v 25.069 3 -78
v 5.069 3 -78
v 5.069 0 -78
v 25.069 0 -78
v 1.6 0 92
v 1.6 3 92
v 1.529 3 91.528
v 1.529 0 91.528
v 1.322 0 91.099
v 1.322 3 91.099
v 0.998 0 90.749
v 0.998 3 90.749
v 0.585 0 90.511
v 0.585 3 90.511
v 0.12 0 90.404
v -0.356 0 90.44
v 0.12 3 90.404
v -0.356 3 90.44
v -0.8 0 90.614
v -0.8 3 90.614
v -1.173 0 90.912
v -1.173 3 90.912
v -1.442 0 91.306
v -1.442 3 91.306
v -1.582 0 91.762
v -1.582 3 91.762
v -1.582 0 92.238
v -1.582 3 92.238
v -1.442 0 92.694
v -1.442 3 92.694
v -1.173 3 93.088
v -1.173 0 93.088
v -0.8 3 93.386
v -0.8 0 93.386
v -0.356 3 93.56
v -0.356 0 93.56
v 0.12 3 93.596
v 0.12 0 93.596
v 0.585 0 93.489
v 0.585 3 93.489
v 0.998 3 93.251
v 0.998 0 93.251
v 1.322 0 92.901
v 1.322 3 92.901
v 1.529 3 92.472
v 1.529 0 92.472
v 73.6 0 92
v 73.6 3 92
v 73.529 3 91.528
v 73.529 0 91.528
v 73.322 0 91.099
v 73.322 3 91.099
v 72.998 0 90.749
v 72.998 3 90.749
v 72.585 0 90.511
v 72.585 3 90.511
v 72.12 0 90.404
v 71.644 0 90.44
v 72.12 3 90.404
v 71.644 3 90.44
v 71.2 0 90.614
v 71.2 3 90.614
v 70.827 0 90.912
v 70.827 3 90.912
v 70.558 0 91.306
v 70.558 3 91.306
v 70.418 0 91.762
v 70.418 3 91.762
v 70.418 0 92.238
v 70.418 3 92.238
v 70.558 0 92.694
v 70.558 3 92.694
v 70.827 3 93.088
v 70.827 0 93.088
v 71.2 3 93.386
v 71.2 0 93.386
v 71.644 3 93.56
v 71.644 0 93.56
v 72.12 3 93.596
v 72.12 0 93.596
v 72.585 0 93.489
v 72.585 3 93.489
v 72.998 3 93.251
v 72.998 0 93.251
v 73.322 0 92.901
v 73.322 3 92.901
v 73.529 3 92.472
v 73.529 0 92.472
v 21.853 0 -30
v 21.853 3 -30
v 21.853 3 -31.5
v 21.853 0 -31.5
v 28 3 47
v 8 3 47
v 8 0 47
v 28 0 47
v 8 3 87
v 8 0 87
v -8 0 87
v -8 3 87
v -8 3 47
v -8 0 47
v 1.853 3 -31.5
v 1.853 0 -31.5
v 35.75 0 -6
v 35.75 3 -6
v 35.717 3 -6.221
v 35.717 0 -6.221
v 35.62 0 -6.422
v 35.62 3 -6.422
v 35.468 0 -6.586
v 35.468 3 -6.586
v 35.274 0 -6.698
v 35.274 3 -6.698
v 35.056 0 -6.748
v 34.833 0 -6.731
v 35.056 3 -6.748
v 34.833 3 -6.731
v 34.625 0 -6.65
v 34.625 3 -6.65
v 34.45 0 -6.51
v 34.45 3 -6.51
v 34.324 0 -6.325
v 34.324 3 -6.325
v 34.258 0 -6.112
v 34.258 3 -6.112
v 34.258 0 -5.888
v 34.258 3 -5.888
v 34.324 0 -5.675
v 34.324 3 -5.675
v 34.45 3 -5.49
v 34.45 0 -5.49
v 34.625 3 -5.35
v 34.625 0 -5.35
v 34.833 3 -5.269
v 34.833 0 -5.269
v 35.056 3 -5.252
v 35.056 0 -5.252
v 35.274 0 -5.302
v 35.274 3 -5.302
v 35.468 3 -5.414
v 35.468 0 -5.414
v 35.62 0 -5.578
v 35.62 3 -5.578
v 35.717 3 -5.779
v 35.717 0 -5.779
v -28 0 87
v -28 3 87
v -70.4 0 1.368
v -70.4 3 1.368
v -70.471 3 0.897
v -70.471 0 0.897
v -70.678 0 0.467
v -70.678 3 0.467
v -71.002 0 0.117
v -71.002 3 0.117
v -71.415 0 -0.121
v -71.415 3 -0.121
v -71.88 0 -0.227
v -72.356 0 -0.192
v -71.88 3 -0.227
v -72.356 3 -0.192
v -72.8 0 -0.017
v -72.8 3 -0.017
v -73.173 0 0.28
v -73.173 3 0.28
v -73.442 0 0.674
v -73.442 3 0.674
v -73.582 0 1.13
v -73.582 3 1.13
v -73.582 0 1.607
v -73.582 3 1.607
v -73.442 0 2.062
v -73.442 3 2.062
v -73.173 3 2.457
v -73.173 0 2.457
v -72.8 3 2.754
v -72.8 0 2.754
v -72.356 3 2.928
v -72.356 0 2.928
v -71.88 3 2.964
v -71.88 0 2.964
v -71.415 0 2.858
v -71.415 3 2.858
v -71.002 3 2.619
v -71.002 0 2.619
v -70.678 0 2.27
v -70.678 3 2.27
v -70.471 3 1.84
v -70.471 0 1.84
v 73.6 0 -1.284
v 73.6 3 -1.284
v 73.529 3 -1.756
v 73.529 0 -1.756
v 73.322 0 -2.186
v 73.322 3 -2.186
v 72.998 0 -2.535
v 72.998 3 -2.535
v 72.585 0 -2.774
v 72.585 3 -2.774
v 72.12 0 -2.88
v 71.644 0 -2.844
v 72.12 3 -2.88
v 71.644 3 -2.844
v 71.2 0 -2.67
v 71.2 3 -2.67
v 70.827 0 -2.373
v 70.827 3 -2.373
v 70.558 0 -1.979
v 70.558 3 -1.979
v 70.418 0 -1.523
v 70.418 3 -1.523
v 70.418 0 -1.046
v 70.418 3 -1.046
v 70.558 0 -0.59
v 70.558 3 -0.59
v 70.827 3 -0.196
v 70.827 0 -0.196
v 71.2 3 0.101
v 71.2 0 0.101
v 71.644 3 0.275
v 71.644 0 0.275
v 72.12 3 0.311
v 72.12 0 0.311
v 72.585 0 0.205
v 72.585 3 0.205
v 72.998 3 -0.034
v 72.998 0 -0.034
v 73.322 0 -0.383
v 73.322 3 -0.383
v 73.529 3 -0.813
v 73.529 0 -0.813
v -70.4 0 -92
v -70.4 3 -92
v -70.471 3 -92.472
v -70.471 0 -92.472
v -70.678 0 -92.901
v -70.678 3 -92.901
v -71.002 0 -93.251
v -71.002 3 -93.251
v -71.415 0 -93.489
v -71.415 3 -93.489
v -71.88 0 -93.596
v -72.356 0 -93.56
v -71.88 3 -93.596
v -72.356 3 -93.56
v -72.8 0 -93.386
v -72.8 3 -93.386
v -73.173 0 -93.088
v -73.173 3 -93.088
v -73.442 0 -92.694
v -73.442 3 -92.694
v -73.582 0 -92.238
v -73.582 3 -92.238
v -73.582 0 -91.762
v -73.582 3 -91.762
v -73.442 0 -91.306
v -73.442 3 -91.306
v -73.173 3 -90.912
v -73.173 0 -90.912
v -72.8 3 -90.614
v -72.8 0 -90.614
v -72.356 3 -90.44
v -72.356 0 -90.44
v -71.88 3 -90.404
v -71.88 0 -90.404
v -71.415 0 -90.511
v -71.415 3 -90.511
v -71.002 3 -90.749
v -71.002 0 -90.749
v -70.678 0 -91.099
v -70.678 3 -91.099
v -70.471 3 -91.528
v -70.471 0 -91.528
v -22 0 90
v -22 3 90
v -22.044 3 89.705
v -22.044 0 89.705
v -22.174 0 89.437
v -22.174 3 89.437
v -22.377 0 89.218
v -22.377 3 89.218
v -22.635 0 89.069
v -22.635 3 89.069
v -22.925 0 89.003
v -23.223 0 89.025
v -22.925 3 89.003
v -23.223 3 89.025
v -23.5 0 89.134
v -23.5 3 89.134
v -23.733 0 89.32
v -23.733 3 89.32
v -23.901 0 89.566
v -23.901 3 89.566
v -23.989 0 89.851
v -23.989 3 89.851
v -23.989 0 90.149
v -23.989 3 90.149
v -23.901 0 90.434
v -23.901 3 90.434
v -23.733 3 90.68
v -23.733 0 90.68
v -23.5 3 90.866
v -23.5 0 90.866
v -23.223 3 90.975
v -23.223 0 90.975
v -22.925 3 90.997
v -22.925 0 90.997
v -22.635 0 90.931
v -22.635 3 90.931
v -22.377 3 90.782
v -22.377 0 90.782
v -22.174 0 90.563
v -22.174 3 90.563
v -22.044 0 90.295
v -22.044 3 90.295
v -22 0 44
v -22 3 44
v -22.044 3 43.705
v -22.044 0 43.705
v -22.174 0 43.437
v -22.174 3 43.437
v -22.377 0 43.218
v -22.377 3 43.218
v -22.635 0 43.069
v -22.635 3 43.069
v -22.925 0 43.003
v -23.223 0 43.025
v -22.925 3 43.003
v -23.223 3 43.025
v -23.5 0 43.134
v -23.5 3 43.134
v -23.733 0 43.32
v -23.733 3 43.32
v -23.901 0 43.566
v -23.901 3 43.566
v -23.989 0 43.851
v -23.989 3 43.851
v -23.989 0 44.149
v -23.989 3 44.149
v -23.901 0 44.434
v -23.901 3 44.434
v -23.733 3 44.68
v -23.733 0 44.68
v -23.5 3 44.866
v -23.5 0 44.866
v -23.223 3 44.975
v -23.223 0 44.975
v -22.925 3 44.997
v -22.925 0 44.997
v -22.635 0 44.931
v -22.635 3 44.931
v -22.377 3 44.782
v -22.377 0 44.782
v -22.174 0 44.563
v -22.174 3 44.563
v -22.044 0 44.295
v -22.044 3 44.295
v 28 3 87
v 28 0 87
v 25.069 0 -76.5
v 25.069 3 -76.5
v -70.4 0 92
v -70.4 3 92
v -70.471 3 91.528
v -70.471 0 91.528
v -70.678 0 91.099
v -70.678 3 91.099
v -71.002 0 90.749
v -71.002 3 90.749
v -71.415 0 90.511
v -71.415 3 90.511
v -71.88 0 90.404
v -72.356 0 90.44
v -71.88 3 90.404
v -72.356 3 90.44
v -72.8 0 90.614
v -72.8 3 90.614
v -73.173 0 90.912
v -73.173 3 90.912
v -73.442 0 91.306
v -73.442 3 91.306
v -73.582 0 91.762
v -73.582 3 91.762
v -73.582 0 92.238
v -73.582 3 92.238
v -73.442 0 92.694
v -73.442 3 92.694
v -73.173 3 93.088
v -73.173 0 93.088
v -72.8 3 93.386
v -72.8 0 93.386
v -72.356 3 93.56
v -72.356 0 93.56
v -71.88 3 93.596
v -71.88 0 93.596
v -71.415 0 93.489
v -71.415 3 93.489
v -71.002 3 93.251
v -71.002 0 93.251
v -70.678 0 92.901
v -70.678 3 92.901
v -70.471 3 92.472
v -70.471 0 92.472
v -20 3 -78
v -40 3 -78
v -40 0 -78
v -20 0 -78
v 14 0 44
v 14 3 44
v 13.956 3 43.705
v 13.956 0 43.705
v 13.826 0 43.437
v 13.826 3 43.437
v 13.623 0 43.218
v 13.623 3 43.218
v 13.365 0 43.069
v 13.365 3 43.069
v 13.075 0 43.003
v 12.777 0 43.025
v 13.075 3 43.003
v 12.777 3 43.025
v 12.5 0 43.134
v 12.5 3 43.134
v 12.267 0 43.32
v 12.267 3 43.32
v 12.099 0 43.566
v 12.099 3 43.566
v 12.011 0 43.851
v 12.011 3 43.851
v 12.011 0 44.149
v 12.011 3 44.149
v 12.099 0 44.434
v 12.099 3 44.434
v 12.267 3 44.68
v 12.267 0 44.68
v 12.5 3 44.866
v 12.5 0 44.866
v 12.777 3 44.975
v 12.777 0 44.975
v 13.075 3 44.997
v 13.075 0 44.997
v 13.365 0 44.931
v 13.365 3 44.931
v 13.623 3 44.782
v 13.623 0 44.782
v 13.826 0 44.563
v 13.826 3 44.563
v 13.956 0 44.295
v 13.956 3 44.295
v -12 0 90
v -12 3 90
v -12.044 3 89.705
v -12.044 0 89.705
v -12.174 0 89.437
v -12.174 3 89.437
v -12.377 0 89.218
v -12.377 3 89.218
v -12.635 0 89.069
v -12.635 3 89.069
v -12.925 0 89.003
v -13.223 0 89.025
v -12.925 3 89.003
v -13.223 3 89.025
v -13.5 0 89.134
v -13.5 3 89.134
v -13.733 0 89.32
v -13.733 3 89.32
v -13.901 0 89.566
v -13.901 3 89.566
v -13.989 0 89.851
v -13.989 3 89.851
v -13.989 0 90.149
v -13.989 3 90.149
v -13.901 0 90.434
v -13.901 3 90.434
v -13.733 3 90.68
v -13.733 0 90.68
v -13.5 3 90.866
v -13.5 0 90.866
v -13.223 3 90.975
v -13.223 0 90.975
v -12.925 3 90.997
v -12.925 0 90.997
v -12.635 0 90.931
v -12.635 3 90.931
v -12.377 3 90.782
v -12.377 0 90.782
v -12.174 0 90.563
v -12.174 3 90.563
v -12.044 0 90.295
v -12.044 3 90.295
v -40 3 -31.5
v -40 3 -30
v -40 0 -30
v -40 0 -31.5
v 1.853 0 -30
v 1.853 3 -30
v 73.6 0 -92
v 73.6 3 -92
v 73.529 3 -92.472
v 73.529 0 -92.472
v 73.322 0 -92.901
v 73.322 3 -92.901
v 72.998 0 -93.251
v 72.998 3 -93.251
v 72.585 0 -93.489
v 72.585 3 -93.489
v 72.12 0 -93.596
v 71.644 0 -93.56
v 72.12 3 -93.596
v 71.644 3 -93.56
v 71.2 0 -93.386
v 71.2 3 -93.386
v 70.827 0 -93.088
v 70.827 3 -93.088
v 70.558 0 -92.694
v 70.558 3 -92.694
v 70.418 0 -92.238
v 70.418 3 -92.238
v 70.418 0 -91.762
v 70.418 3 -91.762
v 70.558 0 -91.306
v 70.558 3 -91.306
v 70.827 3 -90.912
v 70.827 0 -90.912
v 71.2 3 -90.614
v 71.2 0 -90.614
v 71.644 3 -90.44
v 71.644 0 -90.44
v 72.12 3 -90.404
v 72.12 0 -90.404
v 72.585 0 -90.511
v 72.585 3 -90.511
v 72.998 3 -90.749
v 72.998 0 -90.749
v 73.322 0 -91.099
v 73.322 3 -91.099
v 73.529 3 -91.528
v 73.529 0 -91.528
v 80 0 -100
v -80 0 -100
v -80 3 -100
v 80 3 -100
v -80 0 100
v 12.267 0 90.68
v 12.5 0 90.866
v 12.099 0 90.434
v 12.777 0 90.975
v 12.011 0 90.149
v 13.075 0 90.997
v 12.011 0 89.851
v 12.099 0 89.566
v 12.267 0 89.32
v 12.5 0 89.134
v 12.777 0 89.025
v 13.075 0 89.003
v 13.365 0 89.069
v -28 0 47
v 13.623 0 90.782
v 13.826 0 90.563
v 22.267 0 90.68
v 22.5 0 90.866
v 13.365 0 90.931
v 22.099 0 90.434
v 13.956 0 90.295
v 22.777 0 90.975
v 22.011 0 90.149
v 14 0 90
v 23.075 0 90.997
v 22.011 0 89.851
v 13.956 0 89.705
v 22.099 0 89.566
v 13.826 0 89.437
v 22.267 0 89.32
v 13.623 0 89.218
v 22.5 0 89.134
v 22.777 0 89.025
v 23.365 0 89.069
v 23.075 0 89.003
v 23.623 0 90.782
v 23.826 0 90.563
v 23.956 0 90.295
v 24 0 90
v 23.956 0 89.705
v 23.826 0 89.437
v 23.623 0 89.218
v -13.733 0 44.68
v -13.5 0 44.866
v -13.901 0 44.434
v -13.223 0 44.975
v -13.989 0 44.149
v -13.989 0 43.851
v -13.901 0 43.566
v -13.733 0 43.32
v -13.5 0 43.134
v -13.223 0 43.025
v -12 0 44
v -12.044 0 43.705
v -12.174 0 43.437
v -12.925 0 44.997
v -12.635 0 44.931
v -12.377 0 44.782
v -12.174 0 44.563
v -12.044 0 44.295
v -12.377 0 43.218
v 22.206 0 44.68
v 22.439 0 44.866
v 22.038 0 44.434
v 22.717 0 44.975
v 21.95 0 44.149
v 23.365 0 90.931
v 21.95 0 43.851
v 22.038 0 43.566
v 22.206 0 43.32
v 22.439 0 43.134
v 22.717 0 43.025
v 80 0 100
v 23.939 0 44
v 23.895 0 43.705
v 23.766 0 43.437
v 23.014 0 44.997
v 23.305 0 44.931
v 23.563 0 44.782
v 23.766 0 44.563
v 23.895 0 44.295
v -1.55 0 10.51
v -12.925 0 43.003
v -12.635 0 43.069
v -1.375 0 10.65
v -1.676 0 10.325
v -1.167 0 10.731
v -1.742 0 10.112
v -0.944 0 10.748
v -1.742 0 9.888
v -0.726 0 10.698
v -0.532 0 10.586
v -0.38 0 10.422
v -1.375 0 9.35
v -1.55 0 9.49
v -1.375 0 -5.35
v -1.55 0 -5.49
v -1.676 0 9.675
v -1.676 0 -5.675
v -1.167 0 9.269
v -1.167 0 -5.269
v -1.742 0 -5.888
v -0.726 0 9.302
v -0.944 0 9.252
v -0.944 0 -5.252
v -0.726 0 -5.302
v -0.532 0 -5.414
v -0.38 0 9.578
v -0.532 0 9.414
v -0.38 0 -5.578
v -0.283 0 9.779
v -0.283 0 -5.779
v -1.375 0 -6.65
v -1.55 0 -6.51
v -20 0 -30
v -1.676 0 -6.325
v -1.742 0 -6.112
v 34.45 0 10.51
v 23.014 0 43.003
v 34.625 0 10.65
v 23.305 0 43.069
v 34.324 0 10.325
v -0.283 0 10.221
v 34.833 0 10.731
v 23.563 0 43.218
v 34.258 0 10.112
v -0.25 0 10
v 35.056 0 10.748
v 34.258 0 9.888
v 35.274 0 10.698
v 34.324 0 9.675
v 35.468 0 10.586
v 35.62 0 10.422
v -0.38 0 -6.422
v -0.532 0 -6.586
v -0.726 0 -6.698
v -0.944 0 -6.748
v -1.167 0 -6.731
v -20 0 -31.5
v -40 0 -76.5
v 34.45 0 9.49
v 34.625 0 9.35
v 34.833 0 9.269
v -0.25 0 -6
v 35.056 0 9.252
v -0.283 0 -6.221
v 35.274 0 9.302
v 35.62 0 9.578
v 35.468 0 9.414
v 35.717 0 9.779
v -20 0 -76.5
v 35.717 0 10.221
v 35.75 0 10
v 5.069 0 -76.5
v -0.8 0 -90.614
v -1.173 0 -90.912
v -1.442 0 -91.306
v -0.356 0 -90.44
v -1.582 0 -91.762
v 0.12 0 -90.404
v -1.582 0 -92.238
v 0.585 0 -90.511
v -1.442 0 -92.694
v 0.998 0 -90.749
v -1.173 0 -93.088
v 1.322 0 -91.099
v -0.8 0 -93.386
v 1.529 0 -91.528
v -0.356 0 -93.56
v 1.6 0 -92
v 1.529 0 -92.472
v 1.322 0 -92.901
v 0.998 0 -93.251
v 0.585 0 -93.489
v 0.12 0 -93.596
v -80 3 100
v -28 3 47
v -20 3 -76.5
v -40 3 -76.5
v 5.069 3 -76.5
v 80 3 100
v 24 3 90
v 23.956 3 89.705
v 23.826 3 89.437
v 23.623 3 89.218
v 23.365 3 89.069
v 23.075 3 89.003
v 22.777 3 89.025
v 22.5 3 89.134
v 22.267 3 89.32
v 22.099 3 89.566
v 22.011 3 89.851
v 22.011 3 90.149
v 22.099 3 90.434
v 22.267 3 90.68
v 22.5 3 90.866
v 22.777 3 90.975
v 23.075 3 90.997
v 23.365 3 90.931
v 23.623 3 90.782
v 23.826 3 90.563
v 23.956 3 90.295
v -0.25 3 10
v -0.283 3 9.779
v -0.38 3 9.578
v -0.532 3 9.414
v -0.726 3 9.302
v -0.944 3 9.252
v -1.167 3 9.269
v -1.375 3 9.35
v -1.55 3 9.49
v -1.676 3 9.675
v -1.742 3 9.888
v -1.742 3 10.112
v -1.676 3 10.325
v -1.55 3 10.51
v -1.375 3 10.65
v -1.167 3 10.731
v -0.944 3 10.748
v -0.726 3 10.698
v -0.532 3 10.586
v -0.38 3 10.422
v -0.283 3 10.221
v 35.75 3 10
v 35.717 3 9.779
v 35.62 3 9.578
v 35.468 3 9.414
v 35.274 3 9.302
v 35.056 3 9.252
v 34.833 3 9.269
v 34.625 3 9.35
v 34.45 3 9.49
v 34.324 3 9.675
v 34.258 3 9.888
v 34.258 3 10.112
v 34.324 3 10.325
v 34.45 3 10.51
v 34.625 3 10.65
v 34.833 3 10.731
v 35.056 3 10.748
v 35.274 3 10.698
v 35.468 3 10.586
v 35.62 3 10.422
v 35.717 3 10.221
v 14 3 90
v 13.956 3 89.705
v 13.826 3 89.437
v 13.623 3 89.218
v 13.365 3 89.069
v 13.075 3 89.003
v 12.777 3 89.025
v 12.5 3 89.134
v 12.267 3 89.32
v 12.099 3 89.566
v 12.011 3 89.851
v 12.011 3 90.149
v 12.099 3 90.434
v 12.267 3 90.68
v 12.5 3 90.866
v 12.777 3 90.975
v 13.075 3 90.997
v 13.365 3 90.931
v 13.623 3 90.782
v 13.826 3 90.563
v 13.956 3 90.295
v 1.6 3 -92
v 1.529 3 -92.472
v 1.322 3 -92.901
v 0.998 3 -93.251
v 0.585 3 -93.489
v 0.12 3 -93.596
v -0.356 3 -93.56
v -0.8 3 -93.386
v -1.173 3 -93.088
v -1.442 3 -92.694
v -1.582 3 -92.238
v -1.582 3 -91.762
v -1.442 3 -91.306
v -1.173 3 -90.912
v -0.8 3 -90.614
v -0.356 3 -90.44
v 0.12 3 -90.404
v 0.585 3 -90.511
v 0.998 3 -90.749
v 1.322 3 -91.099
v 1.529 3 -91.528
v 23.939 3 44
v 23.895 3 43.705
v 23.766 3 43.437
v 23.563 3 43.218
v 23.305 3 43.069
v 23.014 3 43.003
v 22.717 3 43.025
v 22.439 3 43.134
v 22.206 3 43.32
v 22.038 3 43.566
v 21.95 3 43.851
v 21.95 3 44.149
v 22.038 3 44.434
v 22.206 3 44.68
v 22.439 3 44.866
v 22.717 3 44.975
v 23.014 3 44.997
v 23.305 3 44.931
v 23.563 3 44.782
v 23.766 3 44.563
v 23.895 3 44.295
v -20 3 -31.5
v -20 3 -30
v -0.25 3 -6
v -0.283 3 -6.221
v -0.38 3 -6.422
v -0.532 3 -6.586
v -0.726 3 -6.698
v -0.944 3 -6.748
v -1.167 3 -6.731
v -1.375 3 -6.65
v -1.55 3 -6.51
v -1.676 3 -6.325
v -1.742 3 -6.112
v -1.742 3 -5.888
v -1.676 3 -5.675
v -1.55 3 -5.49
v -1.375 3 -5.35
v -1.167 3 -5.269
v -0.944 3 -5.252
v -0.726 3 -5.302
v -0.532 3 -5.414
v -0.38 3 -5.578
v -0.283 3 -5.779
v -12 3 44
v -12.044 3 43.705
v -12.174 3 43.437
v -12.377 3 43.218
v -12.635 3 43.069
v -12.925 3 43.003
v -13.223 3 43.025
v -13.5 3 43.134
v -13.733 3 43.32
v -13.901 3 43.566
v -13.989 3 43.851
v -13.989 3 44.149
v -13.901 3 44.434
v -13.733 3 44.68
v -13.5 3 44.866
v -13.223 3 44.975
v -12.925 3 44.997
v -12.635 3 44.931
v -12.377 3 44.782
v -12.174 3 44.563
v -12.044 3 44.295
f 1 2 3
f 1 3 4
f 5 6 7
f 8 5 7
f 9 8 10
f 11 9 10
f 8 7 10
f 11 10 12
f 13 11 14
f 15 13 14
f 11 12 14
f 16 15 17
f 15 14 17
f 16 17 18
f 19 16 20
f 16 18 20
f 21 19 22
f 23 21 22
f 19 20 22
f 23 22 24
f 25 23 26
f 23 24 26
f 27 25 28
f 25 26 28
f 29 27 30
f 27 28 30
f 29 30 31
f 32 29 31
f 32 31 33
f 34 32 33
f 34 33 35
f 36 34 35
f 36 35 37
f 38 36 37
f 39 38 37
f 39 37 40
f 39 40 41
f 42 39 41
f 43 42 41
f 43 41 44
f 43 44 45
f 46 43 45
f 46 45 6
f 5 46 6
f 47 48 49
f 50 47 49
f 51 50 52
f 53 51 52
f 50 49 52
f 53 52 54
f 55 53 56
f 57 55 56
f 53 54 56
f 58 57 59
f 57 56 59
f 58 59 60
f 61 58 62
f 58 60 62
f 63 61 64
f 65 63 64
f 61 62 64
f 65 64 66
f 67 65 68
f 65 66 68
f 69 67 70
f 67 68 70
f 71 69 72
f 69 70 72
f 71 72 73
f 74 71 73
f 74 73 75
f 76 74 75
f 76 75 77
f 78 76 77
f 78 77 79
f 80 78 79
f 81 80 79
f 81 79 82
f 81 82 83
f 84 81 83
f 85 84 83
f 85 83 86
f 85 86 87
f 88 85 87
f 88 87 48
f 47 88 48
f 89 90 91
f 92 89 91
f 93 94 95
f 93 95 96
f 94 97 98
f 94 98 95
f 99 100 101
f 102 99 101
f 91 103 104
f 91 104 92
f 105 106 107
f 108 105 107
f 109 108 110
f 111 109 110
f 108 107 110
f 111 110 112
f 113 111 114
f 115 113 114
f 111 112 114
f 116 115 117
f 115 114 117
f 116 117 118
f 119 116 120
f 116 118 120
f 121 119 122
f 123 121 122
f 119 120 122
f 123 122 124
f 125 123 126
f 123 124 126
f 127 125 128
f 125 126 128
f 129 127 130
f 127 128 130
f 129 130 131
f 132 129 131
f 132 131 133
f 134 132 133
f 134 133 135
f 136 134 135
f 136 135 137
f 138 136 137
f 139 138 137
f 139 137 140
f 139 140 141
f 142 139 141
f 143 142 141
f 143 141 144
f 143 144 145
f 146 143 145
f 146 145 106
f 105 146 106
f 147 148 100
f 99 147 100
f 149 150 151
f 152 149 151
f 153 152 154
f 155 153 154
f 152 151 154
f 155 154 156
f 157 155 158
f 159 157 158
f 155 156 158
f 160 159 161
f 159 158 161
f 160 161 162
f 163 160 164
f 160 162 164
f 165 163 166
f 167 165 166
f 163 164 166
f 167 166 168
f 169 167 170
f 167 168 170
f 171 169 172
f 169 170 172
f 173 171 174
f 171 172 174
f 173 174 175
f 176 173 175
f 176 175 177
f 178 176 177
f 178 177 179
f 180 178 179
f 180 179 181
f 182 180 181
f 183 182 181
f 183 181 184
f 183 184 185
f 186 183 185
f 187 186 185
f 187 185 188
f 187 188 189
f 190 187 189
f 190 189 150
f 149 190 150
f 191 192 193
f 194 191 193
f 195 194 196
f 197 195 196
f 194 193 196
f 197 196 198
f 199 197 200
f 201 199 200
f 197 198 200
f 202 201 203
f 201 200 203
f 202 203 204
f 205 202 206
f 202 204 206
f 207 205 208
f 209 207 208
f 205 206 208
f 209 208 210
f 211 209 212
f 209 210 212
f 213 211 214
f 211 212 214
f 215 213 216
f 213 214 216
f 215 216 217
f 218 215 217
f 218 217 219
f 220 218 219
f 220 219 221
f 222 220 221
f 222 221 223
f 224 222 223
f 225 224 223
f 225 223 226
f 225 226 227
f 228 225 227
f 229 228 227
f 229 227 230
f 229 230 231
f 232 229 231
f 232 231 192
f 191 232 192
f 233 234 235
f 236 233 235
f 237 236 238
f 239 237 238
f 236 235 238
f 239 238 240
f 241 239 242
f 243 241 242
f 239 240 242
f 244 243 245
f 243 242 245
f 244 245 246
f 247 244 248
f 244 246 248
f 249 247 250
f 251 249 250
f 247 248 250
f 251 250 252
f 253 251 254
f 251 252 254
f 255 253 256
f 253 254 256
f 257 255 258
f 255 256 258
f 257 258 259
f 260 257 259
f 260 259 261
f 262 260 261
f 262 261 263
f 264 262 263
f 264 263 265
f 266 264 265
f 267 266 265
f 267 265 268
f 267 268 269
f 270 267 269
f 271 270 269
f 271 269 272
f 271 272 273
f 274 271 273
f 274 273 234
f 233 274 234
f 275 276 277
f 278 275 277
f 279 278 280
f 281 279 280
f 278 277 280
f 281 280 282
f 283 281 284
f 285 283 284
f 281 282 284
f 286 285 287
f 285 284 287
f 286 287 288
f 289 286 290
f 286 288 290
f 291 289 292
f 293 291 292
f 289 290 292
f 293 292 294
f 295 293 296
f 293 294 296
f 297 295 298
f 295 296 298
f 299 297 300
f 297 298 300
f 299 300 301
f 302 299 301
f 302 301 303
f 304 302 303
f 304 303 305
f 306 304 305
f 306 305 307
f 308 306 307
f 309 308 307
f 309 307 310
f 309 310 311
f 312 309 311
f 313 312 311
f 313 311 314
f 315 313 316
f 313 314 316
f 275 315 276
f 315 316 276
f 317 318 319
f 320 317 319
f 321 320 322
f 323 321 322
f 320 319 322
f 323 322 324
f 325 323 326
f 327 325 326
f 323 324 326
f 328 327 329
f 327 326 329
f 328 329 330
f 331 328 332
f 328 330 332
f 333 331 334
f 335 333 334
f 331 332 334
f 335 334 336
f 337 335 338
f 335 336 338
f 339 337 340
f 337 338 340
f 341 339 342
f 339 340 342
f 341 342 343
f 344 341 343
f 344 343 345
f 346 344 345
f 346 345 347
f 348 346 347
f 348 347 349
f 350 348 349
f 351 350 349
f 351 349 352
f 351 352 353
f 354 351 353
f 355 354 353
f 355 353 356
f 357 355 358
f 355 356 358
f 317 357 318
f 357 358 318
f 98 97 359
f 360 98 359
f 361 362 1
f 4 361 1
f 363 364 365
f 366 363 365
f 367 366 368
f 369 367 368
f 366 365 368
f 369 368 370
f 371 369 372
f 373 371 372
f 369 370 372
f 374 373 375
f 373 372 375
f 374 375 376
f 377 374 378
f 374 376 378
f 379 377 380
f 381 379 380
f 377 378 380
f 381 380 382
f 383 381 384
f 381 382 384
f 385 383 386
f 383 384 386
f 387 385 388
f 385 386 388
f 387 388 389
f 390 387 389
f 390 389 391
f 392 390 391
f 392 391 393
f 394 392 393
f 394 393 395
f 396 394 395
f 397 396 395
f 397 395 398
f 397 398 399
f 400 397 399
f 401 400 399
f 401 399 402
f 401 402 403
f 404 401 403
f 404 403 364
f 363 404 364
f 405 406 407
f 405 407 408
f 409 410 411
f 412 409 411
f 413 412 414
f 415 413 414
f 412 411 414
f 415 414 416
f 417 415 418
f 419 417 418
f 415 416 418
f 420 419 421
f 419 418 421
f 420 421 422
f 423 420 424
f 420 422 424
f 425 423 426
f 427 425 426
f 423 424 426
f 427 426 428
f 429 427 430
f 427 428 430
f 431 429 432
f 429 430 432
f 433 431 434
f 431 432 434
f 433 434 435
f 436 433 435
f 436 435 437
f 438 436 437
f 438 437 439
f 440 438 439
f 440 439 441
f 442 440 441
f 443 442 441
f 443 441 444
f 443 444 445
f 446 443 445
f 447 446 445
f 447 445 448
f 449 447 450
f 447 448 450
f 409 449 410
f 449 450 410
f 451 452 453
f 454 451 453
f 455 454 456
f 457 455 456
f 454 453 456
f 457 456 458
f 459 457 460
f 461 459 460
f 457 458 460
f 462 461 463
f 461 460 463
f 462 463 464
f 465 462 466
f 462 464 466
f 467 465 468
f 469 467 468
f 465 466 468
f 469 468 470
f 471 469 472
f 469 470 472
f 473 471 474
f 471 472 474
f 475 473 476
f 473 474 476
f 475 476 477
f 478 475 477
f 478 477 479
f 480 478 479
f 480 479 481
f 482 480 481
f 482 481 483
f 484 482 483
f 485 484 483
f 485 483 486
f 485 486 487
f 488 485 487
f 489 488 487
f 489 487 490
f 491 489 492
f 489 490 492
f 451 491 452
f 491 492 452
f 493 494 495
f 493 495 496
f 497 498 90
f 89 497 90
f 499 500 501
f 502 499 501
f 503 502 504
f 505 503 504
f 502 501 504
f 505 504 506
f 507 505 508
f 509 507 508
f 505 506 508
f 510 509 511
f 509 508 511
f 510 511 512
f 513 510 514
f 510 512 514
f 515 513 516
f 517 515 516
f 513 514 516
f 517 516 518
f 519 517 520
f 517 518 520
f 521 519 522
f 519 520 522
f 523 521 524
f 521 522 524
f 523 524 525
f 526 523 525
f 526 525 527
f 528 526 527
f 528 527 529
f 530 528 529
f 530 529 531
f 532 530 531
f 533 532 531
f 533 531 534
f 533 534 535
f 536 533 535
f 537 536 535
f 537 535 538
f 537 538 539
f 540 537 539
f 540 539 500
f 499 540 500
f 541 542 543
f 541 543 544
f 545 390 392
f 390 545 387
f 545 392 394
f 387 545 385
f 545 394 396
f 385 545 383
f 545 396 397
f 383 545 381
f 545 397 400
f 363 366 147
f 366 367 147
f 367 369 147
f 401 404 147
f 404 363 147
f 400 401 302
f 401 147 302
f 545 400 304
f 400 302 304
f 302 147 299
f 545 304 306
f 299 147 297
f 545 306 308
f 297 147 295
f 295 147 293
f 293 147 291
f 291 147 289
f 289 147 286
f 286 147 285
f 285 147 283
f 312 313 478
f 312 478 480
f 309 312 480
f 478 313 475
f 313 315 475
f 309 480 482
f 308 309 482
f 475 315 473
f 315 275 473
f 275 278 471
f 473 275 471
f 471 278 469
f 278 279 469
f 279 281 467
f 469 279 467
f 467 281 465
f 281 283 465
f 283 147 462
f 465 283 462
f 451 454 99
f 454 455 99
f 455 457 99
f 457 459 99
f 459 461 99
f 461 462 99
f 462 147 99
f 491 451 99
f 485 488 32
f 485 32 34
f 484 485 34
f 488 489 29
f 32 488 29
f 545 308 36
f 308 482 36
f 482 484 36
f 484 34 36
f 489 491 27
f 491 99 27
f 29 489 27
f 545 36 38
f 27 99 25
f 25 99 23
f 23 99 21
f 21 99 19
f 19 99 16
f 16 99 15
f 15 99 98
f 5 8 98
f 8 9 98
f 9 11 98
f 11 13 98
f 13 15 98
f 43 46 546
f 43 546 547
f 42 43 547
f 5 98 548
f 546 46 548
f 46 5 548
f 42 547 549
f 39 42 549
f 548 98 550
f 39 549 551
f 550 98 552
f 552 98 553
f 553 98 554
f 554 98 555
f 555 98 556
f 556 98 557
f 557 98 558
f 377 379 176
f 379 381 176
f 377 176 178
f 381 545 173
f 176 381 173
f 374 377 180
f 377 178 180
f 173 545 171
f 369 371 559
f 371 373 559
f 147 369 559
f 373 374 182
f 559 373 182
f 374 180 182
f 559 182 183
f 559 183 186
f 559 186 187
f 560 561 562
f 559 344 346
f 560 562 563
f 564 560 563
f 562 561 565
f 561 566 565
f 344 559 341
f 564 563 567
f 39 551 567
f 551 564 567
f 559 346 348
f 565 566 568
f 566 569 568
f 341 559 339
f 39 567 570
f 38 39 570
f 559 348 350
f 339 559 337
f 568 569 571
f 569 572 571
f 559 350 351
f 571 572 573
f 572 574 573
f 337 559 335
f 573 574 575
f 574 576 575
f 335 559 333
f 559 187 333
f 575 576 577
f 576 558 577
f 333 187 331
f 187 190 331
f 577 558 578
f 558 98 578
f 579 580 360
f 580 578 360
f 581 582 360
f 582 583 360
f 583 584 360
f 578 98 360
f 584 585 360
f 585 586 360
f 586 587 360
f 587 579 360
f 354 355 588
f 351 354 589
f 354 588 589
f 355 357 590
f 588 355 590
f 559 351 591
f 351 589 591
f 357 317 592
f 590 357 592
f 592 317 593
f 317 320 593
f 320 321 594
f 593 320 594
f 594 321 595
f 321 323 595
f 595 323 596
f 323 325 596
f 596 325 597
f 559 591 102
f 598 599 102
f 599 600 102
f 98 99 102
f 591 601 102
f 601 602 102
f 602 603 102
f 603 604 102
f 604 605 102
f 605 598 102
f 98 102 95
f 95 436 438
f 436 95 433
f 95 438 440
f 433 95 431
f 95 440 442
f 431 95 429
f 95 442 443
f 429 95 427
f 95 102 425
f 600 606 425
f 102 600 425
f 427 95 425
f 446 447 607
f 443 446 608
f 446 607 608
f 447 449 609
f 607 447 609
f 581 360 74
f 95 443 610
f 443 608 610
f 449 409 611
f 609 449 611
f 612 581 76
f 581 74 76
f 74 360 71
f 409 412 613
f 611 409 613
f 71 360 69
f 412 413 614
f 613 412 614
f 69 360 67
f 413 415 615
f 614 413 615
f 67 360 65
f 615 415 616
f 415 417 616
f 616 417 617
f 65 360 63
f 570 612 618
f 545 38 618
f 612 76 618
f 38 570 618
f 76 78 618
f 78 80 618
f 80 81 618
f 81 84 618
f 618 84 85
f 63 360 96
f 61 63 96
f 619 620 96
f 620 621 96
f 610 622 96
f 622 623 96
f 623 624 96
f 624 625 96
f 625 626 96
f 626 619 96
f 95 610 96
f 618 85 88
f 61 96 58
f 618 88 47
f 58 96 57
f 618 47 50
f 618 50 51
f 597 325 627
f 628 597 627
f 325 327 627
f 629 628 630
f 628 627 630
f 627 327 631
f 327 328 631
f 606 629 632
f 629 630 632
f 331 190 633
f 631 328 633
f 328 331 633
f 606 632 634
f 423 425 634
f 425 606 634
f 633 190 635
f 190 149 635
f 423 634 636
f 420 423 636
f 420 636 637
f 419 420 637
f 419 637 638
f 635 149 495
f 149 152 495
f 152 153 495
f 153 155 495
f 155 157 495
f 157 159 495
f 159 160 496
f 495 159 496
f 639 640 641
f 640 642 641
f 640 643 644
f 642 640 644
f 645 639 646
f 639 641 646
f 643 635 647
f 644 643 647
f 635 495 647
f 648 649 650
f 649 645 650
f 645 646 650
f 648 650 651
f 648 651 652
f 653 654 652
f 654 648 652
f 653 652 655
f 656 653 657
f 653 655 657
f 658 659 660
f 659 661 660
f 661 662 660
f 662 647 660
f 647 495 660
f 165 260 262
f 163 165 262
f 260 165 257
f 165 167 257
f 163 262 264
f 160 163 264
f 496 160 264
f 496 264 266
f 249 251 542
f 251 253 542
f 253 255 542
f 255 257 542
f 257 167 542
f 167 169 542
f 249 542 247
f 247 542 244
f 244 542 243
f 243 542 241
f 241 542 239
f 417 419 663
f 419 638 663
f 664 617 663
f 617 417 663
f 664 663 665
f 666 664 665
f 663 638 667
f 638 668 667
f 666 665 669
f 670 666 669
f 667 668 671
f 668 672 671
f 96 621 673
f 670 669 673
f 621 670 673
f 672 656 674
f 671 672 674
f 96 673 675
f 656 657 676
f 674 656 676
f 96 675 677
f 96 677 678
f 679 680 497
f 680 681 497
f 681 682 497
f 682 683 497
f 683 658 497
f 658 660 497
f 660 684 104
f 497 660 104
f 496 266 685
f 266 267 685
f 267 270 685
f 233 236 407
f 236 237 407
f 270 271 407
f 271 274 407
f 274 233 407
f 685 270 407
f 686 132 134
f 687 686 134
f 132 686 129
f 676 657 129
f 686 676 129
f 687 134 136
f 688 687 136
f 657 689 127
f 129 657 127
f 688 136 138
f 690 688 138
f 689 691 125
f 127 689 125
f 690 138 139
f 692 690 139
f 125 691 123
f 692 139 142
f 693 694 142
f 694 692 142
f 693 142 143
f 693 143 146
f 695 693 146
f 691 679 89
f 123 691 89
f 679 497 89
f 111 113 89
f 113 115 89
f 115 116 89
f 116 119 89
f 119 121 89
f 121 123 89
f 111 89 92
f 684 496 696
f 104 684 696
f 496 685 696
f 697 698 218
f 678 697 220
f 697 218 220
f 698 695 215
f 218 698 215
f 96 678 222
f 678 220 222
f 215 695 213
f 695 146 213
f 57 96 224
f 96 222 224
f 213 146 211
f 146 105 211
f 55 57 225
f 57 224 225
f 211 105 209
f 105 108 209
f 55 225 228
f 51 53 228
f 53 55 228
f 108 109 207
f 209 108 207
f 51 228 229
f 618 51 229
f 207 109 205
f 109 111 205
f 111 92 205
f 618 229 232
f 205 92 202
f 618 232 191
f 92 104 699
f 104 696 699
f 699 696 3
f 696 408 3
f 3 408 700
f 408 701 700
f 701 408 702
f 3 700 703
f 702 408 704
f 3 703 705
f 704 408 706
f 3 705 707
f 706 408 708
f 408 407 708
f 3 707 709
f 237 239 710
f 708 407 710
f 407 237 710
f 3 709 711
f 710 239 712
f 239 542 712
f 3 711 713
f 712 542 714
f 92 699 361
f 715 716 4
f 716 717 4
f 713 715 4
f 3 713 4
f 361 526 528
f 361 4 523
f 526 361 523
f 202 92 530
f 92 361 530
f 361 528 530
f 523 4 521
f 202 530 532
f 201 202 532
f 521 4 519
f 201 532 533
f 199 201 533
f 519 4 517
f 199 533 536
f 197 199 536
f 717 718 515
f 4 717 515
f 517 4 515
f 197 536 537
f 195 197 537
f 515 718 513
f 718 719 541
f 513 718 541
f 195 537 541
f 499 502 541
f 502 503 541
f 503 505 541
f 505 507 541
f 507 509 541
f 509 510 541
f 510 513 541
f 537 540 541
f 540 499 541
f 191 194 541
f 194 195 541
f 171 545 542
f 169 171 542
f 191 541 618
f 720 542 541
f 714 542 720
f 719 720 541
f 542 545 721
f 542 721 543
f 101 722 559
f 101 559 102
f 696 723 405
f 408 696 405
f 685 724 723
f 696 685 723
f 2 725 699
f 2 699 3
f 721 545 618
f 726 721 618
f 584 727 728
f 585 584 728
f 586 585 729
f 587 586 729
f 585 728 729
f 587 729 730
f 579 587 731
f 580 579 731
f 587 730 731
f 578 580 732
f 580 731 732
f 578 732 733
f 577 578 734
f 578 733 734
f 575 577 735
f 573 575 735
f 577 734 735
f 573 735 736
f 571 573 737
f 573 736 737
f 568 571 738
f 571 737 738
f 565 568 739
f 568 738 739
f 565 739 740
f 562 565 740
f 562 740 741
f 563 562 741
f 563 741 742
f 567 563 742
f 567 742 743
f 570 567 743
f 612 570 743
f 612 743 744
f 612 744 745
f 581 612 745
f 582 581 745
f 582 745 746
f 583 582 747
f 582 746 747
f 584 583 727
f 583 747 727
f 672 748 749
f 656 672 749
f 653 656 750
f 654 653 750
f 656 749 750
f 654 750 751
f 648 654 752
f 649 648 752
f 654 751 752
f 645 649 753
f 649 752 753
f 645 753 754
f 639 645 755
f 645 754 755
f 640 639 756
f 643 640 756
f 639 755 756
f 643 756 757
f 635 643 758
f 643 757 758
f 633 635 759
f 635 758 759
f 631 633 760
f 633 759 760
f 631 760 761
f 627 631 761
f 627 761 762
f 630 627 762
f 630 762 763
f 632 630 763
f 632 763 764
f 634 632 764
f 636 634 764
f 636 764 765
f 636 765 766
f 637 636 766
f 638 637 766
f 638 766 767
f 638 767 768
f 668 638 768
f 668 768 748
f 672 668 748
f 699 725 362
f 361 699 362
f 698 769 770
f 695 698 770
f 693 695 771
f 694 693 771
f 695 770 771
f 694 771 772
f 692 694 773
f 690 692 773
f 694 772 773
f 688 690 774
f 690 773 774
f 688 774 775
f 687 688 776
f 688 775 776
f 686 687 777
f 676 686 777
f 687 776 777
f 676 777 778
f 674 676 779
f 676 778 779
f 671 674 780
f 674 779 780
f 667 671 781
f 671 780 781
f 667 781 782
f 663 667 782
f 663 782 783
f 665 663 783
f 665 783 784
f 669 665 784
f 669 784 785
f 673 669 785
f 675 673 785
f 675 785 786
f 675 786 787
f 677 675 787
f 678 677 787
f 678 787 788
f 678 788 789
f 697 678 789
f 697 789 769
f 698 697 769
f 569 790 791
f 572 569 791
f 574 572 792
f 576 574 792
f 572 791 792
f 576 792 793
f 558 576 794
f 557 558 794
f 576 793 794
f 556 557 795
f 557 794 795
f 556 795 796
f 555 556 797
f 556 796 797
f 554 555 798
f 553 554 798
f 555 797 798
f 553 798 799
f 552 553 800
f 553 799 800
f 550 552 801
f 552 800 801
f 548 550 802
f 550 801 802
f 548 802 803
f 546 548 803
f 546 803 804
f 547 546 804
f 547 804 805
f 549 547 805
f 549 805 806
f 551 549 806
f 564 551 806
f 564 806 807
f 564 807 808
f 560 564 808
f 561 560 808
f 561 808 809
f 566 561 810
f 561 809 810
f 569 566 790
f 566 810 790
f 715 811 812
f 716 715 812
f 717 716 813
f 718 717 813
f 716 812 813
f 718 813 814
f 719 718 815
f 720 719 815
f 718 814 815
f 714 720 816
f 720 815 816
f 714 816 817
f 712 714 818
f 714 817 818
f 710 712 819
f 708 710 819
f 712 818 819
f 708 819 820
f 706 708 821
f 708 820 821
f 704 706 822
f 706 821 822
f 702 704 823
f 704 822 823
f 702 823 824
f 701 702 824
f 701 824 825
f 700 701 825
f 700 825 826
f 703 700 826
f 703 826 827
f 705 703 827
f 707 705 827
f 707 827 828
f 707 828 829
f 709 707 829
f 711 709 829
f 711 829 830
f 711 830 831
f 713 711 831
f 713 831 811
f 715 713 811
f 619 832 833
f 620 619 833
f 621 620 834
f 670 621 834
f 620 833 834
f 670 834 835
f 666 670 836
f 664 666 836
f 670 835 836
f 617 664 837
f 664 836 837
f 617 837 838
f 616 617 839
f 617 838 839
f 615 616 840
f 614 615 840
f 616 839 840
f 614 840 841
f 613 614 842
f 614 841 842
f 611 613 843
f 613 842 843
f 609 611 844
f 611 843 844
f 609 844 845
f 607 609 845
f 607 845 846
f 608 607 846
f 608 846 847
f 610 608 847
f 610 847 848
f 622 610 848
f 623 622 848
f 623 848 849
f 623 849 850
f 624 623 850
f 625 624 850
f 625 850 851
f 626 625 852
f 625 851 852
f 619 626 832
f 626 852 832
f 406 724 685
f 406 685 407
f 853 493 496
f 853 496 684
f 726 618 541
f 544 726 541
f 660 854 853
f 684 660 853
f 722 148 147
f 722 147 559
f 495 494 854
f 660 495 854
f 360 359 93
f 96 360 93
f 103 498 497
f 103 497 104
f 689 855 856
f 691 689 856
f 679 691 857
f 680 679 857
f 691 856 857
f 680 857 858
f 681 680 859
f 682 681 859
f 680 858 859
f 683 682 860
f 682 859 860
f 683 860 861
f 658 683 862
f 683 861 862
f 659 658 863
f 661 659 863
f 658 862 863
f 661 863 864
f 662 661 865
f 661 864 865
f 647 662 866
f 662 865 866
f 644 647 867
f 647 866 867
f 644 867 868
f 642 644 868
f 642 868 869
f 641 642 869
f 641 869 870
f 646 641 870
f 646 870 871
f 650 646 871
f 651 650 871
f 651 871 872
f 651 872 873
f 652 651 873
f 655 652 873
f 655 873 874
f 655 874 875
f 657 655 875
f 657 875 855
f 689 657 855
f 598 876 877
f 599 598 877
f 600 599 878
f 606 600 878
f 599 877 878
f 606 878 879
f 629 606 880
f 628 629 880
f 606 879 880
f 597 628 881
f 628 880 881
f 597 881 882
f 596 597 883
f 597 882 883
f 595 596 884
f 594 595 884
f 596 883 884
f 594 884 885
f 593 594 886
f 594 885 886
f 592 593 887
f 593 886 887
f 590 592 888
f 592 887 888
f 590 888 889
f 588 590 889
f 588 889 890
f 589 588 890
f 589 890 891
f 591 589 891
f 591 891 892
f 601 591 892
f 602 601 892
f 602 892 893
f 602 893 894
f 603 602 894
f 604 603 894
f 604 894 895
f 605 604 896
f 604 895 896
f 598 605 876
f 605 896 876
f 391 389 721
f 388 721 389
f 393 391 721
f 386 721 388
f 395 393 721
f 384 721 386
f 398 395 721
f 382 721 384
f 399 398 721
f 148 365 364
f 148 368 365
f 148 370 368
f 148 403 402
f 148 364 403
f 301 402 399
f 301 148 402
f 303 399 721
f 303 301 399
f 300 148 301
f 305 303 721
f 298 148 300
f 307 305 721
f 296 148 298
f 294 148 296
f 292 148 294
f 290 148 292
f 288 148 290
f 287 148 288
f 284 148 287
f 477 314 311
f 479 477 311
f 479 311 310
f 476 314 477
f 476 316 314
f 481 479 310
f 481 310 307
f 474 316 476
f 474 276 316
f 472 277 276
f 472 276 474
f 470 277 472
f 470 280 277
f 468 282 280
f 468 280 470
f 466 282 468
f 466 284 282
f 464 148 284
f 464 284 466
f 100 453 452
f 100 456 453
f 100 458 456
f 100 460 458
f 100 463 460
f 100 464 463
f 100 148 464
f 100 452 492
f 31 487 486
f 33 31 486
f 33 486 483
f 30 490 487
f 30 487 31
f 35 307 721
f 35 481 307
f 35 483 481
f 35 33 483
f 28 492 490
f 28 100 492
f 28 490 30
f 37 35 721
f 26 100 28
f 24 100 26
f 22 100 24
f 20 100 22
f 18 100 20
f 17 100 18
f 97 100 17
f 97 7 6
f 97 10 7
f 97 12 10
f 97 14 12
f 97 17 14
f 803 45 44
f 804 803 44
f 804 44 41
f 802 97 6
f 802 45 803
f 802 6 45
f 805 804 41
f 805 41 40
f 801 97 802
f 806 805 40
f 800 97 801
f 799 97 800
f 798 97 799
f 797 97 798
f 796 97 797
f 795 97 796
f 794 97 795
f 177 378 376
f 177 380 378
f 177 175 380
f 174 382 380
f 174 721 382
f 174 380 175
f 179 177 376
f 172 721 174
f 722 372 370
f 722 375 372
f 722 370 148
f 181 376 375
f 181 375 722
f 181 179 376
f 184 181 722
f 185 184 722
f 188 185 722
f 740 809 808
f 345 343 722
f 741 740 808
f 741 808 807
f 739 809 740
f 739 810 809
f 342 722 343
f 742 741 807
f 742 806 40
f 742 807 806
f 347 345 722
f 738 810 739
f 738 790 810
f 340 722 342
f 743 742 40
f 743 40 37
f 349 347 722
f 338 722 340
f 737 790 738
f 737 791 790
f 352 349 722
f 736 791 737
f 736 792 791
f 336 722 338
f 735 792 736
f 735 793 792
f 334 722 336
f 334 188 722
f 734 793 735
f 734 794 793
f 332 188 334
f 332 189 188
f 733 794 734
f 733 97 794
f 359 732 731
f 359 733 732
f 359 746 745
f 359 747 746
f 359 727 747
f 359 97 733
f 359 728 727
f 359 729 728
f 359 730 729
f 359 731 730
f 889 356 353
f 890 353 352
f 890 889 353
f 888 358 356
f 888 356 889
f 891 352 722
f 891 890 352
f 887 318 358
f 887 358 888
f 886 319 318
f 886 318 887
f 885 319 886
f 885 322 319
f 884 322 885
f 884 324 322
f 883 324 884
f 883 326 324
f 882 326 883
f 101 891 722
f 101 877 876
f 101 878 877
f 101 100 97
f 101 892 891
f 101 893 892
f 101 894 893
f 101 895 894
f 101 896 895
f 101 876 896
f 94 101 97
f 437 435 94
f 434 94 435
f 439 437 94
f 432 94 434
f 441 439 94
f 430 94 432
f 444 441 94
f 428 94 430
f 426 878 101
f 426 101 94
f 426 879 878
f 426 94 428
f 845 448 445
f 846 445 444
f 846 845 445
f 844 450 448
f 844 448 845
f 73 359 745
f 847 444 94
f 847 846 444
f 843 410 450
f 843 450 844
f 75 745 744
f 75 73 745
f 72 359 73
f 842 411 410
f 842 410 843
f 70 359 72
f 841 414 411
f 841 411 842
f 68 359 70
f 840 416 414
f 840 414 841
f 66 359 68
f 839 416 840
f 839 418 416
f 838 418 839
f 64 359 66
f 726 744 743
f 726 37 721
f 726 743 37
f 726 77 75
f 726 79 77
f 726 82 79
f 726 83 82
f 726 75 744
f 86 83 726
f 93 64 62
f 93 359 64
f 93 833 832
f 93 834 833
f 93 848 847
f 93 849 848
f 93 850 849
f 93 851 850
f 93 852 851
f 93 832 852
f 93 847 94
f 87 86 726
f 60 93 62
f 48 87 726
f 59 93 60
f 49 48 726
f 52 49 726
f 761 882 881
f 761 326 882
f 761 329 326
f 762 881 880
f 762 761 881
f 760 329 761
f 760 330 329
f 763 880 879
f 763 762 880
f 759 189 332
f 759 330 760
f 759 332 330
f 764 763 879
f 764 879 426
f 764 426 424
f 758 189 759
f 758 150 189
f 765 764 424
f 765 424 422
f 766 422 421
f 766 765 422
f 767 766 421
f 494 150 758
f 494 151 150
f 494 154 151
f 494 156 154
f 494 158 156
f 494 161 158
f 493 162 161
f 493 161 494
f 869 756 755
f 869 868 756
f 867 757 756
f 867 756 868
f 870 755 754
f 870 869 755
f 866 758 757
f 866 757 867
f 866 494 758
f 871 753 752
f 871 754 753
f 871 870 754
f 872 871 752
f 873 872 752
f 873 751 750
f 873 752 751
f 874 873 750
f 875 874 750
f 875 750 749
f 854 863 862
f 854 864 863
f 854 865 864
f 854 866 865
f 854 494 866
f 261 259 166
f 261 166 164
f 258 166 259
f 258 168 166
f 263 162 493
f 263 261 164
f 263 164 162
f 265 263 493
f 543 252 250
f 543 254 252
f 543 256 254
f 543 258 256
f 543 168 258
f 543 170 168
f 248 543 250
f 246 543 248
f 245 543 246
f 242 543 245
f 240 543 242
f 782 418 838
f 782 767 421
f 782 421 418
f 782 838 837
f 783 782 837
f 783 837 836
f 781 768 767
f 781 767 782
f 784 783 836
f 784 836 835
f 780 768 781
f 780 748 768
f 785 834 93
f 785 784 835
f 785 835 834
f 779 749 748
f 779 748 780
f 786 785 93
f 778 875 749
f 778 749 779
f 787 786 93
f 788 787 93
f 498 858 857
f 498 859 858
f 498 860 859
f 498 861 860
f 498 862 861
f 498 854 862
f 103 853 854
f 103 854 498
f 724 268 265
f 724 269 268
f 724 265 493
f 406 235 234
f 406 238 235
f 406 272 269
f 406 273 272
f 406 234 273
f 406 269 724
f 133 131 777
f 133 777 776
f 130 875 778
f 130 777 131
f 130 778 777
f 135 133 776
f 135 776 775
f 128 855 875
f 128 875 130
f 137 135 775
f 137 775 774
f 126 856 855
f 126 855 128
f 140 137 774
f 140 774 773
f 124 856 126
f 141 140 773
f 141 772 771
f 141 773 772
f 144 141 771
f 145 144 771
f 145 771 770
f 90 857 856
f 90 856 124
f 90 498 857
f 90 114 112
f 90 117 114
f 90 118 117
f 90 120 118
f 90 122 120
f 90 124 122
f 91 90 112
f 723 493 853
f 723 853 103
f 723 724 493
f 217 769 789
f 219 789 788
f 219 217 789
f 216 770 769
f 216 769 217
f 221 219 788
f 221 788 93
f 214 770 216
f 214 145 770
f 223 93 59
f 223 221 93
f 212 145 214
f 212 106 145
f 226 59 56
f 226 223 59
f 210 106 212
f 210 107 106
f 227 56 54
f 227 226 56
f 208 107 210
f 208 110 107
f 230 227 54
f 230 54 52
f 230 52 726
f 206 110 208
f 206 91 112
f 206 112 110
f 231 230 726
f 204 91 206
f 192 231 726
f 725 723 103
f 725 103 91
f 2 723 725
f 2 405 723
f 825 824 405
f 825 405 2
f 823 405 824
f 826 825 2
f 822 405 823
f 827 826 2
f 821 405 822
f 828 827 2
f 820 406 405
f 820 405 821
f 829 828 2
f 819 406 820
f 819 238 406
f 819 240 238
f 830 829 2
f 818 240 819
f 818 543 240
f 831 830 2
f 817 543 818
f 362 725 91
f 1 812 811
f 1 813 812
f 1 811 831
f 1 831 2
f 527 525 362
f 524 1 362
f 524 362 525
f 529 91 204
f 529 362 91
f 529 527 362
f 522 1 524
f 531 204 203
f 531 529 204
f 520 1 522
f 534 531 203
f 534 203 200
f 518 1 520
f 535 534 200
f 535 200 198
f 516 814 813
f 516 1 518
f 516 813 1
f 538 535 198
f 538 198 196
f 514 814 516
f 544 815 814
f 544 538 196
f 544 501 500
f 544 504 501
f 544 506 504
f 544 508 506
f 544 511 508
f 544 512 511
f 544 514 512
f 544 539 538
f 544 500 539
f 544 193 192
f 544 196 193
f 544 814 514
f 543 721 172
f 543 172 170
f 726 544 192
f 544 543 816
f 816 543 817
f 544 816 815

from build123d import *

# Parameters (mm, degrees)
SKETCH_1_W          = 160
SKETCH_1_H          = 200
EXTRUDE_2_DEPTH     = 3
SKETCH_2_R          = 1
SKETCH_2_W          = 20
SKETCH_2_H          = 40
CUT_EXTRUDE_1_DEPTH = 3
SKETCH_3_R          = 0.75
CUT_EXTRUDE_2_DEPTH = 10
SKETCH_4_R          = 1.6
CUT_EXTRUDE_3_DEPTH = 10
SKETCH_5_W          = 20
SKETCH_5_H          = 1.5
CUT_EXTRUDE_4_DEPTH = 10


with BuildPart() as part:
    # 草图1 → 凸台-拉伸2 (new body)
    with BuildSketch(Plane(origin=(0, 0, 0), x_dir=(1, 0, 0), z_dir=(0, 1, 0))):
        Rectangle(SKETCH_1_W, SKETCH_1_H)
    extrude(amount=EXTRUDE_2_DEPTH)

    # 草图2 → 切除-拉伸1 (cut)
    with BuildSketch(Plane(origin=(0, 3, 0), x_dir=(1, 0, 0), z_dir=(0, 1, 0))):
        with Locations((23, -90)):
            Circle(SKETCH_2_R)
        with Locations((13, -44)):
            Circle(SKETCH_2_R)
        with Locations((-23, -90)):
            Circle(SKETCH_2_R)
        with Locations((-23, -44)):
            Circle(SKETCH_2_R)
        with Locations((-13, -44)):
            Circle(SKETCH_2_R)
        with Locations((-13, -90)):
            Circle(SKETCH_2_R)
        with Locations((13, -90)):
            Circle(SKETCH_2_R)
        with Locations((22.939303547, -44)):
            Circle(SKETCH_2_R)
        with Locations((-18, -67)):
            Rectangle(SKETCH_2_W, SKETCH_2_H)
        with Locations((18, -67)):
            Rectangle(SKETCH_2_W, SKETCH_2_H)
    extrude(amount=-CUT_EXTRUDE_1_DEPTH, mode=Mode.SUBTRACT)

    # 草图3 → 切除-拉伸2 (cut)
    with BuildSketch(Plane(origin=(0, 3, 0), x_dir=(1, 0, 0), z_dir=(0, 1, 0))):
        with Locations((35, -10)):
            Circle(SKETCH_3_R)
        with Locations((35, 6)):
            Circle(SKETCH_3_R)
        with Locations((-1, -10)):
            Circle(SKETCH_3_R)
        with Locations((-1, 6)):
            Circle(SKETCH_3_R)
    extrude(amount=-CUT_EXTRUDE_2_DEPTH, mode=Mode.SUBTRACT)

    # 草图4 → 切除-拉伸3 (cut)
    with BuildSketch(Plane(origin=(0, 3, 0), x_dir=(1, 0, 0), z_dir=(0, 1, 0))):
        with Locations((72, 1.284440395)):
            Circle(SKETCH_4_R)
        with Locations((-72, -1.368262766)):
            Circle(SKETCH_4_R)
        with Locations((72, 92)):
            Circle(SKETCH_4_R)
        with Locations((-72, 92)):
            Circle(SKETCH_4_R)
        with Locations((-72, -92)):
            Circle(SKETCH_4_R)
        with Locations((72, -92)):
            Circle(SKETCH_4_R)
        with Locations((0, -92)):
            Circle(SKETCH_4_R)
        with Locations((0, 92)):
            Circle(SKETCH_4_R)
    extrude(amount=-CUT_EXTRUDE_3_DEPTH, mode=Mode.SUBTRACT)

    # 草图5 → 切除-拉伸4 (cut)
    with BuildSketch(Plane(origin=(0, 3, 0), x_dir=(1, 0, 0), z_dir=(0, 1, 0))):
        with Locations((-30, 77.25)):
            Rectangle(SKETCH_5_W, SKETCH_5_H)
        with Locations((-30, 30.75)):
            Rectangle(SKETCH_5_W, SKETCH_5_H)
        with Locations((15.068831665, 77.25)):
            Rectangle(SKETCH_5_W, SKETCH_5_H)
        with Locations((11.85252458, 30.75)):
            Rectangle(SKETCH_5_W, SKETCH_5_H)
    extrude(amount=-CUT_EXTRUDE_4_DEPTH, mode=Mode.SUBTRACT)


solid = part.part
